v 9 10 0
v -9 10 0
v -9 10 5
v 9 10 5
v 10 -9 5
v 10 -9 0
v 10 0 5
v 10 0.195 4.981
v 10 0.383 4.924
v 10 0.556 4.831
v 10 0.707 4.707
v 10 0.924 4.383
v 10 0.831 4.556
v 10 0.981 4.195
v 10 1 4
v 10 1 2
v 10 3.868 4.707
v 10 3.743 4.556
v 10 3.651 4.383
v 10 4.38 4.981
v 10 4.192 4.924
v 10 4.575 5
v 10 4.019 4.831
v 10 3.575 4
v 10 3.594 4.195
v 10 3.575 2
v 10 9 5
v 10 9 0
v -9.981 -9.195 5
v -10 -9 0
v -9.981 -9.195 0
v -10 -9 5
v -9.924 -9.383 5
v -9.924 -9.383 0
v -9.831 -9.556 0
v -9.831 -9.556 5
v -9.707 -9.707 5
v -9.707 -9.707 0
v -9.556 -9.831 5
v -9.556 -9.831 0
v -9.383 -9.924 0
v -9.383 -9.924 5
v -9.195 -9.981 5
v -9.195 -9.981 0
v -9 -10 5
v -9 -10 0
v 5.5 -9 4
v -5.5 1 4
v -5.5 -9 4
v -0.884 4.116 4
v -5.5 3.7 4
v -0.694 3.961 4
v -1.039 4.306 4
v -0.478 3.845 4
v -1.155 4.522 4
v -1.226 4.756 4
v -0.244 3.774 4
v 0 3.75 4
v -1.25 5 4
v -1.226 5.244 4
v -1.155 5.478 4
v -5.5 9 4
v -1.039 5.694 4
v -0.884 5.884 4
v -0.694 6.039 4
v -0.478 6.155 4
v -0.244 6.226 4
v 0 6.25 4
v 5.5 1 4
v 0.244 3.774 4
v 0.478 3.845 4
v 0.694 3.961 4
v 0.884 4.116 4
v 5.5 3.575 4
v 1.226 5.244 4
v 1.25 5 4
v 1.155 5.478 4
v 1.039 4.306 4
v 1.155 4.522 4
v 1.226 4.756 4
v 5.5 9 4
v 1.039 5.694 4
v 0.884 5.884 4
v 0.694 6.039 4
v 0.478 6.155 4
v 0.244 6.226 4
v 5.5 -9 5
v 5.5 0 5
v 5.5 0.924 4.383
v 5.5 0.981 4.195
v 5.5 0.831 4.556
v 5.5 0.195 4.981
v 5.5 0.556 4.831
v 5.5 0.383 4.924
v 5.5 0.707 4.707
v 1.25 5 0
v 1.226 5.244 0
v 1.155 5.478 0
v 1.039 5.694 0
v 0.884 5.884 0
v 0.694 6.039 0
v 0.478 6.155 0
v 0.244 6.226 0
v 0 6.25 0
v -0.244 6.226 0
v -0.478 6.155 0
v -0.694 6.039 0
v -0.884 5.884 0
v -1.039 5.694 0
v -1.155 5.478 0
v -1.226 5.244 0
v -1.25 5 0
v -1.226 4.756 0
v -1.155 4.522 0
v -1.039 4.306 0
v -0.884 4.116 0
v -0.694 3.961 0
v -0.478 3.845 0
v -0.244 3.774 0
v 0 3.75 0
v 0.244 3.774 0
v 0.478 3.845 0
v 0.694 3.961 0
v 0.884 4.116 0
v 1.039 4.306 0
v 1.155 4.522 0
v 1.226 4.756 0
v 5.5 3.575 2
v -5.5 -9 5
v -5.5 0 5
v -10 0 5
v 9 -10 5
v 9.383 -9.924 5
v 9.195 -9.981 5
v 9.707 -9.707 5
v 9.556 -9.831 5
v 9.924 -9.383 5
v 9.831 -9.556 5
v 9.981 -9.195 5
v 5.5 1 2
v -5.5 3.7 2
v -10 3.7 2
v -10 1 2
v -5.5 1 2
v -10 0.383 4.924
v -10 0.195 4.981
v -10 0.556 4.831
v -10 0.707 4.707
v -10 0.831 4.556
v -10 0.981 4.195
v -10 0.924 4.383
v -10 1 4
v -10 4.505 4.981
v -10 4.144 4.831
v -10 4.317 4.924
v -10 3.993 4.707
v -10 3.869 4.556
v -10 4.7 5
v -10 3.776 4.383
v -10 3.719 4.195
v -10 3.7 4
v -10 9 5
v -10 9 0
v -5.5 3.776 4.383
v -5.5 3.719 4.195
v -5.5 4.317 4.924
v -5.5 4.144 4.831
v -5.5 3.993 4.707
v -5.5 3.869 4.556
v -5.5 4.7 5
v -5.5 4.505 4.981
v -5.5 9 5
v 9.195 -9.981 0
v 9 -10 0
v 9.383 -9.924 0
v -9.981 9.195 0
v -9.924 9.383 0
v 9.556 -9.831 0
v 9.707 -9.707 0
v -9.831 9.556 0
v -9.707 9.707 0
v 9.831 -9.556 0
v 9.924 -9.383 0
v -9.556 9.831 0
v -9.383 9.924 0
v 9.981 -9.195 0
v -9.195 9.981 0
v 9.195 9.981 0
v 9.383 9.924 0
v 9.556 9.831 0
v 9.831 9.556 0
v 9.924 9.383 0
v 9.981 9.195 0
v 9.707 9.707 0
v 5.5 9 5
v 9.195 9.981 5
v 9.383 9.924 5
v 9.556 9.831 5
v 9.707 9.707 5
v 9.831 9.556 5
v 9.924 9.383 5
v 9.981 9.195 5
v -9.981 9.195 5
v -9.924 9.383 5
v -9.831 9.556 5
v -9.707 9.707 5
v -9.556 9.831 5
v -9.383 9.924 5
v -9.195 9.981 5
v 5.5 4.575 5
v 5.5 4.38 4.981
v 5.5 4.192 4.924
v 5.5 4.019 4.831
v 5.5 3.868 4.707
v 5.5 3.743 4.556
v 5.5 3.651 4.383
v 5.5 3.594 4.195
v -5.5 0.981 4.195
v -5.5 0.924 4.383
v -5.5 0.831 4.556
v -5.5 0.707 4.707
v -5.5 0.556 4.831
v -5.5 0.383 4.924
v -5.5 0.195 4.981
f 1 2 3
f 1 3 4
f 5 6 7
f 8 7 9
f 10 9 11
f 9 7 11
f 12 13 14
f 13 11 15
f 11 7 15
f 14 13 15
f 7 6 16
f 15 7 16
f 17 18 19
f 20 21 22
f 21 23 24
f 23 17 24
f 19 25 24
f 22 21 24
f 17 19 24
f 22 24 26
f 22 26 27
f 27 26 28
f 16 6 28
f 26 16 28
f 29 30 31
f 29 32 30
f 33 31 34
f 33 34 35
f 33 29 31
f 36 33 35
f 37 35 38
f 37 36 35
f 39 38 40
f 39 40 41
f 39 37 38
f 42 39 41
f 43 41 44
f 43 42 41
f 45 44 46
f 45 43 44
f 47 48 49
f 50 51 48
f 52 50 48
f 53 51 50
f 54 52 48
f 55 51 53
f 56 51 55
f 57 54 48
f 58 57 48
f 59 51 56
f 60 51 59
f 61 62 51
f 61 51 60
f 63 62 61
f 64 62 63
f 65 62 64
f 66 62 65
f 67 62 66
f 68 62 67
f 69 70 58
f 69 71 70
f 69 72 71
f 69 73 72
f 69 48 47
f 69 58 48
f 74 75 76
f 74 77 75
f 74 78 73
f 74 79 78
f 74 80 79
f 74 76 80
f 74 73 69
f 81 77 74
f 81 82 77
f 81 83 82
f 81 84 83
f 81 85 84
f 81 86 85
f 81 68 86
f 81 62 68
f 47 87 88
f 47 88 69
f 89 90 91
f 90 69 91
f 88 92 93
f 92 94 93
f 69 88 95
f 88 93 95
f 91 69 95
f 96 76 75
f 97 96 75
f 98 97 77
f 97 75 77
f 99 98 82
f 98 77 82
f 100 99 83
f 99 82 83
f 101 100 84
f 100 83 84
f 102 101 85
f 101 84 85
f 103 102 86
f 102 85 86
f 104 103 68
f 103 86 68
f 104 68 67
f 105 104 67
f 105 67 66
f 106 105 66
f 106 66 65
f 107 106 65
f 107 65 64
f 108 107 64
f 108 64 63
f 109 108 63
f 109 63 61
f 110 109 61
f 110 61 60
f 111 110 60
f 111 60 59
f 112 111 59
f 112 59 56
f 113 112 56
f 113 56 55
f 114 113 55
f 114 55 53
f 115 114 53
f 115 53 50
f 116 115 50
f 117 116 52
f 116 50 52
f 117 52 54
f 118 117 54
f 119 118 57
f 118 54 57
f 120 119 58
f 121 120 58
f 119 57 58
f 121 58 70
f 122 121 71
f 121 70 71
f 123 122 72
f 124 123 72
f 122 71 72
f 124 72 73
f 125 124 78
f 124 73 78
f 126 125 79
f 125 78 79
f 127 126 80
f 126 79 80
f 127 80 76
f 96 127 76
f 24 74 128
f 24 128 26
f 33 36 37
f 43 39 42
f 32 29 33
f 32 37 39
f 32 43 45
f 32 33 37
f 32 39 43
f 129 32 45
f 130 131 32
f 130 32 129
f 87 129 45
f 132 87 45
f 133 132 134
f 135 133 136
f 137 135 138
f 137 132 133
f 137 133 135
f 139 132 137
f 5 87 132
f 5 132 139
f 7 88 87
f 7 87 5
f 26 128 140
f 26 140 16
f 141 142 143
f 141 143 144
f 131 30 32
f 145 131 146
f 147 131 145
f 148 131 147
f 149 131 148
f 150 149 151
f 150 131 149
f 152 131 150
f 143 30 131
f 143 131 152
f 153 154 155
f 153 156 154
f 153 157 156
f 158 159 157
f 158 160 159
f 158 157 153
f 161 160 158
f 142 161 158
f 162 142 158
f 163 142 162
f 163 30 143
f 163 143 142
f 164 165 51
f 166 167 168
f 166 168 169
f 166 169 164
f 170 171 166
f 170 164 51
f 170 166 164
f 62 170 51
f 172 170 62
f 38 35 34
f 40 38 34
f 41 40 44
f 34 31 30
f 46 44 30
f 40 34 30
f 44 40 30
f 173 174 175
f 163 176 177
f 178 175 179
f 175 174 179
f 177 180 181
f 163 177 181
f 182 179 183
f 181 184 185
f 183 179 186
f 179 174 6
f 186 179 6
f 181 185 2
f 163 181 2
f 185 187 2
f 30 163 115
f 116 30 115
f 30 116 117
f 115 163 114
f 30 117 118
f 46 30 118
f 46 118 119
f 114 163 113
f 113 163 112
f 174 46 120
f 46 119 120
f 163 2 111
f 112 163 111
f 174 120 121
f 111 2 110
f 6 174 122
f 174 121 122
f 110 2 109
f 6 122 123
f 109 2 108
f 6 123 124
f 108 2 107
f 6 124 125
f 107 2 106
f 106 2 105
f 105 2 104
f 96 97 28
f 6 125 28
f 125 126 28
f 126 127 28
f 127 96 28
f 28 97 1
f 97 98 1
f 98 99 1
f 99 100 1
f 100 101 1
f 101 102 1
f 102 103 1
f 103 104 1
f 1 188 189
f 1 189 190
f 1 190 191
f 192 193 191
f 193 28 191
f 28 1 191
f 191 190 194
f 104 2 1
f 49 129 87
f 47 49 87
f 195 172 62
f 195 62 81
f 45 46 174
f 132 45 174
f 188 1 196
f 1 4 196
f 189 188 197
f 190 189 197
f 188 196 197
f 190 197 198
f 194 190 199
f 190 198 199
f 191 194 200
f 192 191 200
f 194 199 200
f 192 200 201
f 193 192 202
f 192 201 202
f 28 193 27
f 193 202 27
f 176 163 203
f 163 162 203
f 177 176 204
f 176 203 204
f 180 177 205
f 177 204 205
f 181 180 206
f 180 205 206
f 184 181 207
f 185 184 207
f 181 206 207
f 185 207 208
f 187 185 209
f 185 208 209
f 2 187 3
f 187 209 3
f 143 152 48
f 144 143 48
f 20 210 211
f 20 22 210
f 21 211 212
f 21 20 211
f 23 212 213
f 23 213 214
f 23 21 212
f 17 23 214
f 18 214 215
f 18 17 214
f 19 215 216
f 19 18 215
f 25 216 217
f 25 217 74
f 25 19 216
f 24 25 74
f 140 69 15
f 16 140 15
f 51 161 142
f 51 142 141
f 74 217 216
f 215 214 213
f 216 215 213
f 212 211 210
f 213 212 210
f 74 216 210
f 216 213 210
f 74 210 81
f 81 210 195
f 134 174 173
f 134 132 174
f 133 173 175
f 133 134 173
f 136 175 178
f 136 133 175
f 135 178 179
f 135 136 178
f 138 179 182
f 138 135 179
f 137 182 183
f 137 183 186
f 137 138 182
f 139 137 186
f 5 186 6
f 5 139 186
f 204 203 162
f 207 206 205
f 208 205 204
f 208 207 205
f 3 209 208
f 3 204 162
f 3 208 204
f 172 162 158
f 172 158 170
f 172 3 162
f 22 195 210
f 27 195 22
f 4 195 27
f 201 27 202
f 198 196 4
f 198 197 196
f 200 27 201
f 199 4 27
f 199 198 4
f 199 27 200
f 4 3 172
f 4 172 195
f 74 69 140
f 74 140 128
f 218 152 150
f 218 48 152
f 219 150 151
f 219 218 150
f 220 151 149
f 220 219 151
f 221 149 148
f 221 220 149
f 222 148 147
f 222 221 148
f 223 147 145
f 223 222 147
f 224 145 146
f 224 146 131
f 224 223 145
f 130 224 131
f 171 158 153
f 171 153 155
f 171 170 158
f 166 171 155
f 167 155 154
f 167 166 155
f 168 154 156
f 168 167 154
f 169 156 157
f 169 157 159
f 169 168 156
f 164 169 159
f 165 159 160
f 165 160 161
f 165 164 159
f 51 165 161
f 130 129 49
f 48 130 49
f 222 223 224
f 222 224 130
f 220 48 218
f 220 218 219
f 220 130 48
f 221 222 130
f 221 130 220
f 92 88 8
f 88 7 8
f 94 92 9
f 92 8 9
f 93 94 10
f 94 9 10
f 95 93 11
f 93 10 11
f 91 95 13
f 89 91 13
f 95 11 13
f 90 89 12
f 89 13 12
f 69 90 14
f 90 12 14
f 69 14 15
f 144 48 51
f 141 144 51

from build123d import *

# Parameters (mm, degrees)
SKETCH_1_W          = 20
SKETCH_1_H          = 20
EXTRUDE_1_DEPTH     = 5
SKETCH_2_W          = 11
SKETCH_2_H          = 18
SKETCH_2_R          = 1.25
CUT_EXTRUDE_1_DEPTH = 1
SKETCH_2_2_R        = 1.25
CUT_EXTRUDE_2_DEPTH = 6
SKETCH_3_W          = 4.5
SKETCH_3_H          = 2.7
SKETCH_3_H_2        = 2.574853583
CUT_EXTRUDE_3_DEPTH = 3
FILLET_1_R          = 1


with BuildPart() as part:
    # Эскиз1 → Бобышка-Вытянуть1 (new body)
    with BuildSketch(Plane.XY):
        Rectangle(SKETCH_1_W, SKETCH_1_H)
    extrude(amount=EXTRUDE_1_DEPTH)

    # Эскиз2 → Вырез-Вытянуть1 (cut)
    with BuildSketch(Plane.XY.offset(5)):
        Rectangle(SKETCH_2_W, SKETCH_2_H)
        with Locations((0, 5)):
            Circle(SKETCH_2_R, mode=Mode.SUBTRACT)
    extrude(amount=-CUT_EXTRUDE_1_DEPTH, mode=Mode.SUBTRACT)

    # Эскиз2<2> → Вырез-Вытянуть2 (cut, through all)
    with BuildSketch(Plane.XY.offset(5)):
        with Locations((0, 5)):
            Circle(SKETCH_2_2_R)
    extrude(amount=-CUT_EXTRUDE_2_DEPTH, mode=Mode.SUBTRACT)

    # Эскиз3 → Вырез-Вытянуть3 (cut)
    with BuildSketch(Plane.XY.offset(5)):
        with Locations((-7.75, 2.35)):
            Rectangle(SKETCH_3_W, SKETCH_3_H)
        with Locations((7.75, 2.287426792)):
            Rectangle(SKETCH_3_W, SKETCH_3_H_2)
    extrude(amount=-CUT_EXTRUDE_3_DEPTH, mode=Mode.SUBTRACT)

    # Скругление1
    fillet_1_edges = [part.edges().sort_by_distance(p)[0] for p in [
        (7.75, 1, 5),
        (7.75, 3.574853583, 5),
        (-7.75, 1, 5),
        (-7.75, 3.7, 5),
        (-10, -10, 2.5),
        (10, -10, 2.5),
        (10, 10, 2.5),
        (-10, 10, 2.5),
    ]]
    fillet(fillet_1_edges, radius=FILLET_1_R)


solid = part.part
